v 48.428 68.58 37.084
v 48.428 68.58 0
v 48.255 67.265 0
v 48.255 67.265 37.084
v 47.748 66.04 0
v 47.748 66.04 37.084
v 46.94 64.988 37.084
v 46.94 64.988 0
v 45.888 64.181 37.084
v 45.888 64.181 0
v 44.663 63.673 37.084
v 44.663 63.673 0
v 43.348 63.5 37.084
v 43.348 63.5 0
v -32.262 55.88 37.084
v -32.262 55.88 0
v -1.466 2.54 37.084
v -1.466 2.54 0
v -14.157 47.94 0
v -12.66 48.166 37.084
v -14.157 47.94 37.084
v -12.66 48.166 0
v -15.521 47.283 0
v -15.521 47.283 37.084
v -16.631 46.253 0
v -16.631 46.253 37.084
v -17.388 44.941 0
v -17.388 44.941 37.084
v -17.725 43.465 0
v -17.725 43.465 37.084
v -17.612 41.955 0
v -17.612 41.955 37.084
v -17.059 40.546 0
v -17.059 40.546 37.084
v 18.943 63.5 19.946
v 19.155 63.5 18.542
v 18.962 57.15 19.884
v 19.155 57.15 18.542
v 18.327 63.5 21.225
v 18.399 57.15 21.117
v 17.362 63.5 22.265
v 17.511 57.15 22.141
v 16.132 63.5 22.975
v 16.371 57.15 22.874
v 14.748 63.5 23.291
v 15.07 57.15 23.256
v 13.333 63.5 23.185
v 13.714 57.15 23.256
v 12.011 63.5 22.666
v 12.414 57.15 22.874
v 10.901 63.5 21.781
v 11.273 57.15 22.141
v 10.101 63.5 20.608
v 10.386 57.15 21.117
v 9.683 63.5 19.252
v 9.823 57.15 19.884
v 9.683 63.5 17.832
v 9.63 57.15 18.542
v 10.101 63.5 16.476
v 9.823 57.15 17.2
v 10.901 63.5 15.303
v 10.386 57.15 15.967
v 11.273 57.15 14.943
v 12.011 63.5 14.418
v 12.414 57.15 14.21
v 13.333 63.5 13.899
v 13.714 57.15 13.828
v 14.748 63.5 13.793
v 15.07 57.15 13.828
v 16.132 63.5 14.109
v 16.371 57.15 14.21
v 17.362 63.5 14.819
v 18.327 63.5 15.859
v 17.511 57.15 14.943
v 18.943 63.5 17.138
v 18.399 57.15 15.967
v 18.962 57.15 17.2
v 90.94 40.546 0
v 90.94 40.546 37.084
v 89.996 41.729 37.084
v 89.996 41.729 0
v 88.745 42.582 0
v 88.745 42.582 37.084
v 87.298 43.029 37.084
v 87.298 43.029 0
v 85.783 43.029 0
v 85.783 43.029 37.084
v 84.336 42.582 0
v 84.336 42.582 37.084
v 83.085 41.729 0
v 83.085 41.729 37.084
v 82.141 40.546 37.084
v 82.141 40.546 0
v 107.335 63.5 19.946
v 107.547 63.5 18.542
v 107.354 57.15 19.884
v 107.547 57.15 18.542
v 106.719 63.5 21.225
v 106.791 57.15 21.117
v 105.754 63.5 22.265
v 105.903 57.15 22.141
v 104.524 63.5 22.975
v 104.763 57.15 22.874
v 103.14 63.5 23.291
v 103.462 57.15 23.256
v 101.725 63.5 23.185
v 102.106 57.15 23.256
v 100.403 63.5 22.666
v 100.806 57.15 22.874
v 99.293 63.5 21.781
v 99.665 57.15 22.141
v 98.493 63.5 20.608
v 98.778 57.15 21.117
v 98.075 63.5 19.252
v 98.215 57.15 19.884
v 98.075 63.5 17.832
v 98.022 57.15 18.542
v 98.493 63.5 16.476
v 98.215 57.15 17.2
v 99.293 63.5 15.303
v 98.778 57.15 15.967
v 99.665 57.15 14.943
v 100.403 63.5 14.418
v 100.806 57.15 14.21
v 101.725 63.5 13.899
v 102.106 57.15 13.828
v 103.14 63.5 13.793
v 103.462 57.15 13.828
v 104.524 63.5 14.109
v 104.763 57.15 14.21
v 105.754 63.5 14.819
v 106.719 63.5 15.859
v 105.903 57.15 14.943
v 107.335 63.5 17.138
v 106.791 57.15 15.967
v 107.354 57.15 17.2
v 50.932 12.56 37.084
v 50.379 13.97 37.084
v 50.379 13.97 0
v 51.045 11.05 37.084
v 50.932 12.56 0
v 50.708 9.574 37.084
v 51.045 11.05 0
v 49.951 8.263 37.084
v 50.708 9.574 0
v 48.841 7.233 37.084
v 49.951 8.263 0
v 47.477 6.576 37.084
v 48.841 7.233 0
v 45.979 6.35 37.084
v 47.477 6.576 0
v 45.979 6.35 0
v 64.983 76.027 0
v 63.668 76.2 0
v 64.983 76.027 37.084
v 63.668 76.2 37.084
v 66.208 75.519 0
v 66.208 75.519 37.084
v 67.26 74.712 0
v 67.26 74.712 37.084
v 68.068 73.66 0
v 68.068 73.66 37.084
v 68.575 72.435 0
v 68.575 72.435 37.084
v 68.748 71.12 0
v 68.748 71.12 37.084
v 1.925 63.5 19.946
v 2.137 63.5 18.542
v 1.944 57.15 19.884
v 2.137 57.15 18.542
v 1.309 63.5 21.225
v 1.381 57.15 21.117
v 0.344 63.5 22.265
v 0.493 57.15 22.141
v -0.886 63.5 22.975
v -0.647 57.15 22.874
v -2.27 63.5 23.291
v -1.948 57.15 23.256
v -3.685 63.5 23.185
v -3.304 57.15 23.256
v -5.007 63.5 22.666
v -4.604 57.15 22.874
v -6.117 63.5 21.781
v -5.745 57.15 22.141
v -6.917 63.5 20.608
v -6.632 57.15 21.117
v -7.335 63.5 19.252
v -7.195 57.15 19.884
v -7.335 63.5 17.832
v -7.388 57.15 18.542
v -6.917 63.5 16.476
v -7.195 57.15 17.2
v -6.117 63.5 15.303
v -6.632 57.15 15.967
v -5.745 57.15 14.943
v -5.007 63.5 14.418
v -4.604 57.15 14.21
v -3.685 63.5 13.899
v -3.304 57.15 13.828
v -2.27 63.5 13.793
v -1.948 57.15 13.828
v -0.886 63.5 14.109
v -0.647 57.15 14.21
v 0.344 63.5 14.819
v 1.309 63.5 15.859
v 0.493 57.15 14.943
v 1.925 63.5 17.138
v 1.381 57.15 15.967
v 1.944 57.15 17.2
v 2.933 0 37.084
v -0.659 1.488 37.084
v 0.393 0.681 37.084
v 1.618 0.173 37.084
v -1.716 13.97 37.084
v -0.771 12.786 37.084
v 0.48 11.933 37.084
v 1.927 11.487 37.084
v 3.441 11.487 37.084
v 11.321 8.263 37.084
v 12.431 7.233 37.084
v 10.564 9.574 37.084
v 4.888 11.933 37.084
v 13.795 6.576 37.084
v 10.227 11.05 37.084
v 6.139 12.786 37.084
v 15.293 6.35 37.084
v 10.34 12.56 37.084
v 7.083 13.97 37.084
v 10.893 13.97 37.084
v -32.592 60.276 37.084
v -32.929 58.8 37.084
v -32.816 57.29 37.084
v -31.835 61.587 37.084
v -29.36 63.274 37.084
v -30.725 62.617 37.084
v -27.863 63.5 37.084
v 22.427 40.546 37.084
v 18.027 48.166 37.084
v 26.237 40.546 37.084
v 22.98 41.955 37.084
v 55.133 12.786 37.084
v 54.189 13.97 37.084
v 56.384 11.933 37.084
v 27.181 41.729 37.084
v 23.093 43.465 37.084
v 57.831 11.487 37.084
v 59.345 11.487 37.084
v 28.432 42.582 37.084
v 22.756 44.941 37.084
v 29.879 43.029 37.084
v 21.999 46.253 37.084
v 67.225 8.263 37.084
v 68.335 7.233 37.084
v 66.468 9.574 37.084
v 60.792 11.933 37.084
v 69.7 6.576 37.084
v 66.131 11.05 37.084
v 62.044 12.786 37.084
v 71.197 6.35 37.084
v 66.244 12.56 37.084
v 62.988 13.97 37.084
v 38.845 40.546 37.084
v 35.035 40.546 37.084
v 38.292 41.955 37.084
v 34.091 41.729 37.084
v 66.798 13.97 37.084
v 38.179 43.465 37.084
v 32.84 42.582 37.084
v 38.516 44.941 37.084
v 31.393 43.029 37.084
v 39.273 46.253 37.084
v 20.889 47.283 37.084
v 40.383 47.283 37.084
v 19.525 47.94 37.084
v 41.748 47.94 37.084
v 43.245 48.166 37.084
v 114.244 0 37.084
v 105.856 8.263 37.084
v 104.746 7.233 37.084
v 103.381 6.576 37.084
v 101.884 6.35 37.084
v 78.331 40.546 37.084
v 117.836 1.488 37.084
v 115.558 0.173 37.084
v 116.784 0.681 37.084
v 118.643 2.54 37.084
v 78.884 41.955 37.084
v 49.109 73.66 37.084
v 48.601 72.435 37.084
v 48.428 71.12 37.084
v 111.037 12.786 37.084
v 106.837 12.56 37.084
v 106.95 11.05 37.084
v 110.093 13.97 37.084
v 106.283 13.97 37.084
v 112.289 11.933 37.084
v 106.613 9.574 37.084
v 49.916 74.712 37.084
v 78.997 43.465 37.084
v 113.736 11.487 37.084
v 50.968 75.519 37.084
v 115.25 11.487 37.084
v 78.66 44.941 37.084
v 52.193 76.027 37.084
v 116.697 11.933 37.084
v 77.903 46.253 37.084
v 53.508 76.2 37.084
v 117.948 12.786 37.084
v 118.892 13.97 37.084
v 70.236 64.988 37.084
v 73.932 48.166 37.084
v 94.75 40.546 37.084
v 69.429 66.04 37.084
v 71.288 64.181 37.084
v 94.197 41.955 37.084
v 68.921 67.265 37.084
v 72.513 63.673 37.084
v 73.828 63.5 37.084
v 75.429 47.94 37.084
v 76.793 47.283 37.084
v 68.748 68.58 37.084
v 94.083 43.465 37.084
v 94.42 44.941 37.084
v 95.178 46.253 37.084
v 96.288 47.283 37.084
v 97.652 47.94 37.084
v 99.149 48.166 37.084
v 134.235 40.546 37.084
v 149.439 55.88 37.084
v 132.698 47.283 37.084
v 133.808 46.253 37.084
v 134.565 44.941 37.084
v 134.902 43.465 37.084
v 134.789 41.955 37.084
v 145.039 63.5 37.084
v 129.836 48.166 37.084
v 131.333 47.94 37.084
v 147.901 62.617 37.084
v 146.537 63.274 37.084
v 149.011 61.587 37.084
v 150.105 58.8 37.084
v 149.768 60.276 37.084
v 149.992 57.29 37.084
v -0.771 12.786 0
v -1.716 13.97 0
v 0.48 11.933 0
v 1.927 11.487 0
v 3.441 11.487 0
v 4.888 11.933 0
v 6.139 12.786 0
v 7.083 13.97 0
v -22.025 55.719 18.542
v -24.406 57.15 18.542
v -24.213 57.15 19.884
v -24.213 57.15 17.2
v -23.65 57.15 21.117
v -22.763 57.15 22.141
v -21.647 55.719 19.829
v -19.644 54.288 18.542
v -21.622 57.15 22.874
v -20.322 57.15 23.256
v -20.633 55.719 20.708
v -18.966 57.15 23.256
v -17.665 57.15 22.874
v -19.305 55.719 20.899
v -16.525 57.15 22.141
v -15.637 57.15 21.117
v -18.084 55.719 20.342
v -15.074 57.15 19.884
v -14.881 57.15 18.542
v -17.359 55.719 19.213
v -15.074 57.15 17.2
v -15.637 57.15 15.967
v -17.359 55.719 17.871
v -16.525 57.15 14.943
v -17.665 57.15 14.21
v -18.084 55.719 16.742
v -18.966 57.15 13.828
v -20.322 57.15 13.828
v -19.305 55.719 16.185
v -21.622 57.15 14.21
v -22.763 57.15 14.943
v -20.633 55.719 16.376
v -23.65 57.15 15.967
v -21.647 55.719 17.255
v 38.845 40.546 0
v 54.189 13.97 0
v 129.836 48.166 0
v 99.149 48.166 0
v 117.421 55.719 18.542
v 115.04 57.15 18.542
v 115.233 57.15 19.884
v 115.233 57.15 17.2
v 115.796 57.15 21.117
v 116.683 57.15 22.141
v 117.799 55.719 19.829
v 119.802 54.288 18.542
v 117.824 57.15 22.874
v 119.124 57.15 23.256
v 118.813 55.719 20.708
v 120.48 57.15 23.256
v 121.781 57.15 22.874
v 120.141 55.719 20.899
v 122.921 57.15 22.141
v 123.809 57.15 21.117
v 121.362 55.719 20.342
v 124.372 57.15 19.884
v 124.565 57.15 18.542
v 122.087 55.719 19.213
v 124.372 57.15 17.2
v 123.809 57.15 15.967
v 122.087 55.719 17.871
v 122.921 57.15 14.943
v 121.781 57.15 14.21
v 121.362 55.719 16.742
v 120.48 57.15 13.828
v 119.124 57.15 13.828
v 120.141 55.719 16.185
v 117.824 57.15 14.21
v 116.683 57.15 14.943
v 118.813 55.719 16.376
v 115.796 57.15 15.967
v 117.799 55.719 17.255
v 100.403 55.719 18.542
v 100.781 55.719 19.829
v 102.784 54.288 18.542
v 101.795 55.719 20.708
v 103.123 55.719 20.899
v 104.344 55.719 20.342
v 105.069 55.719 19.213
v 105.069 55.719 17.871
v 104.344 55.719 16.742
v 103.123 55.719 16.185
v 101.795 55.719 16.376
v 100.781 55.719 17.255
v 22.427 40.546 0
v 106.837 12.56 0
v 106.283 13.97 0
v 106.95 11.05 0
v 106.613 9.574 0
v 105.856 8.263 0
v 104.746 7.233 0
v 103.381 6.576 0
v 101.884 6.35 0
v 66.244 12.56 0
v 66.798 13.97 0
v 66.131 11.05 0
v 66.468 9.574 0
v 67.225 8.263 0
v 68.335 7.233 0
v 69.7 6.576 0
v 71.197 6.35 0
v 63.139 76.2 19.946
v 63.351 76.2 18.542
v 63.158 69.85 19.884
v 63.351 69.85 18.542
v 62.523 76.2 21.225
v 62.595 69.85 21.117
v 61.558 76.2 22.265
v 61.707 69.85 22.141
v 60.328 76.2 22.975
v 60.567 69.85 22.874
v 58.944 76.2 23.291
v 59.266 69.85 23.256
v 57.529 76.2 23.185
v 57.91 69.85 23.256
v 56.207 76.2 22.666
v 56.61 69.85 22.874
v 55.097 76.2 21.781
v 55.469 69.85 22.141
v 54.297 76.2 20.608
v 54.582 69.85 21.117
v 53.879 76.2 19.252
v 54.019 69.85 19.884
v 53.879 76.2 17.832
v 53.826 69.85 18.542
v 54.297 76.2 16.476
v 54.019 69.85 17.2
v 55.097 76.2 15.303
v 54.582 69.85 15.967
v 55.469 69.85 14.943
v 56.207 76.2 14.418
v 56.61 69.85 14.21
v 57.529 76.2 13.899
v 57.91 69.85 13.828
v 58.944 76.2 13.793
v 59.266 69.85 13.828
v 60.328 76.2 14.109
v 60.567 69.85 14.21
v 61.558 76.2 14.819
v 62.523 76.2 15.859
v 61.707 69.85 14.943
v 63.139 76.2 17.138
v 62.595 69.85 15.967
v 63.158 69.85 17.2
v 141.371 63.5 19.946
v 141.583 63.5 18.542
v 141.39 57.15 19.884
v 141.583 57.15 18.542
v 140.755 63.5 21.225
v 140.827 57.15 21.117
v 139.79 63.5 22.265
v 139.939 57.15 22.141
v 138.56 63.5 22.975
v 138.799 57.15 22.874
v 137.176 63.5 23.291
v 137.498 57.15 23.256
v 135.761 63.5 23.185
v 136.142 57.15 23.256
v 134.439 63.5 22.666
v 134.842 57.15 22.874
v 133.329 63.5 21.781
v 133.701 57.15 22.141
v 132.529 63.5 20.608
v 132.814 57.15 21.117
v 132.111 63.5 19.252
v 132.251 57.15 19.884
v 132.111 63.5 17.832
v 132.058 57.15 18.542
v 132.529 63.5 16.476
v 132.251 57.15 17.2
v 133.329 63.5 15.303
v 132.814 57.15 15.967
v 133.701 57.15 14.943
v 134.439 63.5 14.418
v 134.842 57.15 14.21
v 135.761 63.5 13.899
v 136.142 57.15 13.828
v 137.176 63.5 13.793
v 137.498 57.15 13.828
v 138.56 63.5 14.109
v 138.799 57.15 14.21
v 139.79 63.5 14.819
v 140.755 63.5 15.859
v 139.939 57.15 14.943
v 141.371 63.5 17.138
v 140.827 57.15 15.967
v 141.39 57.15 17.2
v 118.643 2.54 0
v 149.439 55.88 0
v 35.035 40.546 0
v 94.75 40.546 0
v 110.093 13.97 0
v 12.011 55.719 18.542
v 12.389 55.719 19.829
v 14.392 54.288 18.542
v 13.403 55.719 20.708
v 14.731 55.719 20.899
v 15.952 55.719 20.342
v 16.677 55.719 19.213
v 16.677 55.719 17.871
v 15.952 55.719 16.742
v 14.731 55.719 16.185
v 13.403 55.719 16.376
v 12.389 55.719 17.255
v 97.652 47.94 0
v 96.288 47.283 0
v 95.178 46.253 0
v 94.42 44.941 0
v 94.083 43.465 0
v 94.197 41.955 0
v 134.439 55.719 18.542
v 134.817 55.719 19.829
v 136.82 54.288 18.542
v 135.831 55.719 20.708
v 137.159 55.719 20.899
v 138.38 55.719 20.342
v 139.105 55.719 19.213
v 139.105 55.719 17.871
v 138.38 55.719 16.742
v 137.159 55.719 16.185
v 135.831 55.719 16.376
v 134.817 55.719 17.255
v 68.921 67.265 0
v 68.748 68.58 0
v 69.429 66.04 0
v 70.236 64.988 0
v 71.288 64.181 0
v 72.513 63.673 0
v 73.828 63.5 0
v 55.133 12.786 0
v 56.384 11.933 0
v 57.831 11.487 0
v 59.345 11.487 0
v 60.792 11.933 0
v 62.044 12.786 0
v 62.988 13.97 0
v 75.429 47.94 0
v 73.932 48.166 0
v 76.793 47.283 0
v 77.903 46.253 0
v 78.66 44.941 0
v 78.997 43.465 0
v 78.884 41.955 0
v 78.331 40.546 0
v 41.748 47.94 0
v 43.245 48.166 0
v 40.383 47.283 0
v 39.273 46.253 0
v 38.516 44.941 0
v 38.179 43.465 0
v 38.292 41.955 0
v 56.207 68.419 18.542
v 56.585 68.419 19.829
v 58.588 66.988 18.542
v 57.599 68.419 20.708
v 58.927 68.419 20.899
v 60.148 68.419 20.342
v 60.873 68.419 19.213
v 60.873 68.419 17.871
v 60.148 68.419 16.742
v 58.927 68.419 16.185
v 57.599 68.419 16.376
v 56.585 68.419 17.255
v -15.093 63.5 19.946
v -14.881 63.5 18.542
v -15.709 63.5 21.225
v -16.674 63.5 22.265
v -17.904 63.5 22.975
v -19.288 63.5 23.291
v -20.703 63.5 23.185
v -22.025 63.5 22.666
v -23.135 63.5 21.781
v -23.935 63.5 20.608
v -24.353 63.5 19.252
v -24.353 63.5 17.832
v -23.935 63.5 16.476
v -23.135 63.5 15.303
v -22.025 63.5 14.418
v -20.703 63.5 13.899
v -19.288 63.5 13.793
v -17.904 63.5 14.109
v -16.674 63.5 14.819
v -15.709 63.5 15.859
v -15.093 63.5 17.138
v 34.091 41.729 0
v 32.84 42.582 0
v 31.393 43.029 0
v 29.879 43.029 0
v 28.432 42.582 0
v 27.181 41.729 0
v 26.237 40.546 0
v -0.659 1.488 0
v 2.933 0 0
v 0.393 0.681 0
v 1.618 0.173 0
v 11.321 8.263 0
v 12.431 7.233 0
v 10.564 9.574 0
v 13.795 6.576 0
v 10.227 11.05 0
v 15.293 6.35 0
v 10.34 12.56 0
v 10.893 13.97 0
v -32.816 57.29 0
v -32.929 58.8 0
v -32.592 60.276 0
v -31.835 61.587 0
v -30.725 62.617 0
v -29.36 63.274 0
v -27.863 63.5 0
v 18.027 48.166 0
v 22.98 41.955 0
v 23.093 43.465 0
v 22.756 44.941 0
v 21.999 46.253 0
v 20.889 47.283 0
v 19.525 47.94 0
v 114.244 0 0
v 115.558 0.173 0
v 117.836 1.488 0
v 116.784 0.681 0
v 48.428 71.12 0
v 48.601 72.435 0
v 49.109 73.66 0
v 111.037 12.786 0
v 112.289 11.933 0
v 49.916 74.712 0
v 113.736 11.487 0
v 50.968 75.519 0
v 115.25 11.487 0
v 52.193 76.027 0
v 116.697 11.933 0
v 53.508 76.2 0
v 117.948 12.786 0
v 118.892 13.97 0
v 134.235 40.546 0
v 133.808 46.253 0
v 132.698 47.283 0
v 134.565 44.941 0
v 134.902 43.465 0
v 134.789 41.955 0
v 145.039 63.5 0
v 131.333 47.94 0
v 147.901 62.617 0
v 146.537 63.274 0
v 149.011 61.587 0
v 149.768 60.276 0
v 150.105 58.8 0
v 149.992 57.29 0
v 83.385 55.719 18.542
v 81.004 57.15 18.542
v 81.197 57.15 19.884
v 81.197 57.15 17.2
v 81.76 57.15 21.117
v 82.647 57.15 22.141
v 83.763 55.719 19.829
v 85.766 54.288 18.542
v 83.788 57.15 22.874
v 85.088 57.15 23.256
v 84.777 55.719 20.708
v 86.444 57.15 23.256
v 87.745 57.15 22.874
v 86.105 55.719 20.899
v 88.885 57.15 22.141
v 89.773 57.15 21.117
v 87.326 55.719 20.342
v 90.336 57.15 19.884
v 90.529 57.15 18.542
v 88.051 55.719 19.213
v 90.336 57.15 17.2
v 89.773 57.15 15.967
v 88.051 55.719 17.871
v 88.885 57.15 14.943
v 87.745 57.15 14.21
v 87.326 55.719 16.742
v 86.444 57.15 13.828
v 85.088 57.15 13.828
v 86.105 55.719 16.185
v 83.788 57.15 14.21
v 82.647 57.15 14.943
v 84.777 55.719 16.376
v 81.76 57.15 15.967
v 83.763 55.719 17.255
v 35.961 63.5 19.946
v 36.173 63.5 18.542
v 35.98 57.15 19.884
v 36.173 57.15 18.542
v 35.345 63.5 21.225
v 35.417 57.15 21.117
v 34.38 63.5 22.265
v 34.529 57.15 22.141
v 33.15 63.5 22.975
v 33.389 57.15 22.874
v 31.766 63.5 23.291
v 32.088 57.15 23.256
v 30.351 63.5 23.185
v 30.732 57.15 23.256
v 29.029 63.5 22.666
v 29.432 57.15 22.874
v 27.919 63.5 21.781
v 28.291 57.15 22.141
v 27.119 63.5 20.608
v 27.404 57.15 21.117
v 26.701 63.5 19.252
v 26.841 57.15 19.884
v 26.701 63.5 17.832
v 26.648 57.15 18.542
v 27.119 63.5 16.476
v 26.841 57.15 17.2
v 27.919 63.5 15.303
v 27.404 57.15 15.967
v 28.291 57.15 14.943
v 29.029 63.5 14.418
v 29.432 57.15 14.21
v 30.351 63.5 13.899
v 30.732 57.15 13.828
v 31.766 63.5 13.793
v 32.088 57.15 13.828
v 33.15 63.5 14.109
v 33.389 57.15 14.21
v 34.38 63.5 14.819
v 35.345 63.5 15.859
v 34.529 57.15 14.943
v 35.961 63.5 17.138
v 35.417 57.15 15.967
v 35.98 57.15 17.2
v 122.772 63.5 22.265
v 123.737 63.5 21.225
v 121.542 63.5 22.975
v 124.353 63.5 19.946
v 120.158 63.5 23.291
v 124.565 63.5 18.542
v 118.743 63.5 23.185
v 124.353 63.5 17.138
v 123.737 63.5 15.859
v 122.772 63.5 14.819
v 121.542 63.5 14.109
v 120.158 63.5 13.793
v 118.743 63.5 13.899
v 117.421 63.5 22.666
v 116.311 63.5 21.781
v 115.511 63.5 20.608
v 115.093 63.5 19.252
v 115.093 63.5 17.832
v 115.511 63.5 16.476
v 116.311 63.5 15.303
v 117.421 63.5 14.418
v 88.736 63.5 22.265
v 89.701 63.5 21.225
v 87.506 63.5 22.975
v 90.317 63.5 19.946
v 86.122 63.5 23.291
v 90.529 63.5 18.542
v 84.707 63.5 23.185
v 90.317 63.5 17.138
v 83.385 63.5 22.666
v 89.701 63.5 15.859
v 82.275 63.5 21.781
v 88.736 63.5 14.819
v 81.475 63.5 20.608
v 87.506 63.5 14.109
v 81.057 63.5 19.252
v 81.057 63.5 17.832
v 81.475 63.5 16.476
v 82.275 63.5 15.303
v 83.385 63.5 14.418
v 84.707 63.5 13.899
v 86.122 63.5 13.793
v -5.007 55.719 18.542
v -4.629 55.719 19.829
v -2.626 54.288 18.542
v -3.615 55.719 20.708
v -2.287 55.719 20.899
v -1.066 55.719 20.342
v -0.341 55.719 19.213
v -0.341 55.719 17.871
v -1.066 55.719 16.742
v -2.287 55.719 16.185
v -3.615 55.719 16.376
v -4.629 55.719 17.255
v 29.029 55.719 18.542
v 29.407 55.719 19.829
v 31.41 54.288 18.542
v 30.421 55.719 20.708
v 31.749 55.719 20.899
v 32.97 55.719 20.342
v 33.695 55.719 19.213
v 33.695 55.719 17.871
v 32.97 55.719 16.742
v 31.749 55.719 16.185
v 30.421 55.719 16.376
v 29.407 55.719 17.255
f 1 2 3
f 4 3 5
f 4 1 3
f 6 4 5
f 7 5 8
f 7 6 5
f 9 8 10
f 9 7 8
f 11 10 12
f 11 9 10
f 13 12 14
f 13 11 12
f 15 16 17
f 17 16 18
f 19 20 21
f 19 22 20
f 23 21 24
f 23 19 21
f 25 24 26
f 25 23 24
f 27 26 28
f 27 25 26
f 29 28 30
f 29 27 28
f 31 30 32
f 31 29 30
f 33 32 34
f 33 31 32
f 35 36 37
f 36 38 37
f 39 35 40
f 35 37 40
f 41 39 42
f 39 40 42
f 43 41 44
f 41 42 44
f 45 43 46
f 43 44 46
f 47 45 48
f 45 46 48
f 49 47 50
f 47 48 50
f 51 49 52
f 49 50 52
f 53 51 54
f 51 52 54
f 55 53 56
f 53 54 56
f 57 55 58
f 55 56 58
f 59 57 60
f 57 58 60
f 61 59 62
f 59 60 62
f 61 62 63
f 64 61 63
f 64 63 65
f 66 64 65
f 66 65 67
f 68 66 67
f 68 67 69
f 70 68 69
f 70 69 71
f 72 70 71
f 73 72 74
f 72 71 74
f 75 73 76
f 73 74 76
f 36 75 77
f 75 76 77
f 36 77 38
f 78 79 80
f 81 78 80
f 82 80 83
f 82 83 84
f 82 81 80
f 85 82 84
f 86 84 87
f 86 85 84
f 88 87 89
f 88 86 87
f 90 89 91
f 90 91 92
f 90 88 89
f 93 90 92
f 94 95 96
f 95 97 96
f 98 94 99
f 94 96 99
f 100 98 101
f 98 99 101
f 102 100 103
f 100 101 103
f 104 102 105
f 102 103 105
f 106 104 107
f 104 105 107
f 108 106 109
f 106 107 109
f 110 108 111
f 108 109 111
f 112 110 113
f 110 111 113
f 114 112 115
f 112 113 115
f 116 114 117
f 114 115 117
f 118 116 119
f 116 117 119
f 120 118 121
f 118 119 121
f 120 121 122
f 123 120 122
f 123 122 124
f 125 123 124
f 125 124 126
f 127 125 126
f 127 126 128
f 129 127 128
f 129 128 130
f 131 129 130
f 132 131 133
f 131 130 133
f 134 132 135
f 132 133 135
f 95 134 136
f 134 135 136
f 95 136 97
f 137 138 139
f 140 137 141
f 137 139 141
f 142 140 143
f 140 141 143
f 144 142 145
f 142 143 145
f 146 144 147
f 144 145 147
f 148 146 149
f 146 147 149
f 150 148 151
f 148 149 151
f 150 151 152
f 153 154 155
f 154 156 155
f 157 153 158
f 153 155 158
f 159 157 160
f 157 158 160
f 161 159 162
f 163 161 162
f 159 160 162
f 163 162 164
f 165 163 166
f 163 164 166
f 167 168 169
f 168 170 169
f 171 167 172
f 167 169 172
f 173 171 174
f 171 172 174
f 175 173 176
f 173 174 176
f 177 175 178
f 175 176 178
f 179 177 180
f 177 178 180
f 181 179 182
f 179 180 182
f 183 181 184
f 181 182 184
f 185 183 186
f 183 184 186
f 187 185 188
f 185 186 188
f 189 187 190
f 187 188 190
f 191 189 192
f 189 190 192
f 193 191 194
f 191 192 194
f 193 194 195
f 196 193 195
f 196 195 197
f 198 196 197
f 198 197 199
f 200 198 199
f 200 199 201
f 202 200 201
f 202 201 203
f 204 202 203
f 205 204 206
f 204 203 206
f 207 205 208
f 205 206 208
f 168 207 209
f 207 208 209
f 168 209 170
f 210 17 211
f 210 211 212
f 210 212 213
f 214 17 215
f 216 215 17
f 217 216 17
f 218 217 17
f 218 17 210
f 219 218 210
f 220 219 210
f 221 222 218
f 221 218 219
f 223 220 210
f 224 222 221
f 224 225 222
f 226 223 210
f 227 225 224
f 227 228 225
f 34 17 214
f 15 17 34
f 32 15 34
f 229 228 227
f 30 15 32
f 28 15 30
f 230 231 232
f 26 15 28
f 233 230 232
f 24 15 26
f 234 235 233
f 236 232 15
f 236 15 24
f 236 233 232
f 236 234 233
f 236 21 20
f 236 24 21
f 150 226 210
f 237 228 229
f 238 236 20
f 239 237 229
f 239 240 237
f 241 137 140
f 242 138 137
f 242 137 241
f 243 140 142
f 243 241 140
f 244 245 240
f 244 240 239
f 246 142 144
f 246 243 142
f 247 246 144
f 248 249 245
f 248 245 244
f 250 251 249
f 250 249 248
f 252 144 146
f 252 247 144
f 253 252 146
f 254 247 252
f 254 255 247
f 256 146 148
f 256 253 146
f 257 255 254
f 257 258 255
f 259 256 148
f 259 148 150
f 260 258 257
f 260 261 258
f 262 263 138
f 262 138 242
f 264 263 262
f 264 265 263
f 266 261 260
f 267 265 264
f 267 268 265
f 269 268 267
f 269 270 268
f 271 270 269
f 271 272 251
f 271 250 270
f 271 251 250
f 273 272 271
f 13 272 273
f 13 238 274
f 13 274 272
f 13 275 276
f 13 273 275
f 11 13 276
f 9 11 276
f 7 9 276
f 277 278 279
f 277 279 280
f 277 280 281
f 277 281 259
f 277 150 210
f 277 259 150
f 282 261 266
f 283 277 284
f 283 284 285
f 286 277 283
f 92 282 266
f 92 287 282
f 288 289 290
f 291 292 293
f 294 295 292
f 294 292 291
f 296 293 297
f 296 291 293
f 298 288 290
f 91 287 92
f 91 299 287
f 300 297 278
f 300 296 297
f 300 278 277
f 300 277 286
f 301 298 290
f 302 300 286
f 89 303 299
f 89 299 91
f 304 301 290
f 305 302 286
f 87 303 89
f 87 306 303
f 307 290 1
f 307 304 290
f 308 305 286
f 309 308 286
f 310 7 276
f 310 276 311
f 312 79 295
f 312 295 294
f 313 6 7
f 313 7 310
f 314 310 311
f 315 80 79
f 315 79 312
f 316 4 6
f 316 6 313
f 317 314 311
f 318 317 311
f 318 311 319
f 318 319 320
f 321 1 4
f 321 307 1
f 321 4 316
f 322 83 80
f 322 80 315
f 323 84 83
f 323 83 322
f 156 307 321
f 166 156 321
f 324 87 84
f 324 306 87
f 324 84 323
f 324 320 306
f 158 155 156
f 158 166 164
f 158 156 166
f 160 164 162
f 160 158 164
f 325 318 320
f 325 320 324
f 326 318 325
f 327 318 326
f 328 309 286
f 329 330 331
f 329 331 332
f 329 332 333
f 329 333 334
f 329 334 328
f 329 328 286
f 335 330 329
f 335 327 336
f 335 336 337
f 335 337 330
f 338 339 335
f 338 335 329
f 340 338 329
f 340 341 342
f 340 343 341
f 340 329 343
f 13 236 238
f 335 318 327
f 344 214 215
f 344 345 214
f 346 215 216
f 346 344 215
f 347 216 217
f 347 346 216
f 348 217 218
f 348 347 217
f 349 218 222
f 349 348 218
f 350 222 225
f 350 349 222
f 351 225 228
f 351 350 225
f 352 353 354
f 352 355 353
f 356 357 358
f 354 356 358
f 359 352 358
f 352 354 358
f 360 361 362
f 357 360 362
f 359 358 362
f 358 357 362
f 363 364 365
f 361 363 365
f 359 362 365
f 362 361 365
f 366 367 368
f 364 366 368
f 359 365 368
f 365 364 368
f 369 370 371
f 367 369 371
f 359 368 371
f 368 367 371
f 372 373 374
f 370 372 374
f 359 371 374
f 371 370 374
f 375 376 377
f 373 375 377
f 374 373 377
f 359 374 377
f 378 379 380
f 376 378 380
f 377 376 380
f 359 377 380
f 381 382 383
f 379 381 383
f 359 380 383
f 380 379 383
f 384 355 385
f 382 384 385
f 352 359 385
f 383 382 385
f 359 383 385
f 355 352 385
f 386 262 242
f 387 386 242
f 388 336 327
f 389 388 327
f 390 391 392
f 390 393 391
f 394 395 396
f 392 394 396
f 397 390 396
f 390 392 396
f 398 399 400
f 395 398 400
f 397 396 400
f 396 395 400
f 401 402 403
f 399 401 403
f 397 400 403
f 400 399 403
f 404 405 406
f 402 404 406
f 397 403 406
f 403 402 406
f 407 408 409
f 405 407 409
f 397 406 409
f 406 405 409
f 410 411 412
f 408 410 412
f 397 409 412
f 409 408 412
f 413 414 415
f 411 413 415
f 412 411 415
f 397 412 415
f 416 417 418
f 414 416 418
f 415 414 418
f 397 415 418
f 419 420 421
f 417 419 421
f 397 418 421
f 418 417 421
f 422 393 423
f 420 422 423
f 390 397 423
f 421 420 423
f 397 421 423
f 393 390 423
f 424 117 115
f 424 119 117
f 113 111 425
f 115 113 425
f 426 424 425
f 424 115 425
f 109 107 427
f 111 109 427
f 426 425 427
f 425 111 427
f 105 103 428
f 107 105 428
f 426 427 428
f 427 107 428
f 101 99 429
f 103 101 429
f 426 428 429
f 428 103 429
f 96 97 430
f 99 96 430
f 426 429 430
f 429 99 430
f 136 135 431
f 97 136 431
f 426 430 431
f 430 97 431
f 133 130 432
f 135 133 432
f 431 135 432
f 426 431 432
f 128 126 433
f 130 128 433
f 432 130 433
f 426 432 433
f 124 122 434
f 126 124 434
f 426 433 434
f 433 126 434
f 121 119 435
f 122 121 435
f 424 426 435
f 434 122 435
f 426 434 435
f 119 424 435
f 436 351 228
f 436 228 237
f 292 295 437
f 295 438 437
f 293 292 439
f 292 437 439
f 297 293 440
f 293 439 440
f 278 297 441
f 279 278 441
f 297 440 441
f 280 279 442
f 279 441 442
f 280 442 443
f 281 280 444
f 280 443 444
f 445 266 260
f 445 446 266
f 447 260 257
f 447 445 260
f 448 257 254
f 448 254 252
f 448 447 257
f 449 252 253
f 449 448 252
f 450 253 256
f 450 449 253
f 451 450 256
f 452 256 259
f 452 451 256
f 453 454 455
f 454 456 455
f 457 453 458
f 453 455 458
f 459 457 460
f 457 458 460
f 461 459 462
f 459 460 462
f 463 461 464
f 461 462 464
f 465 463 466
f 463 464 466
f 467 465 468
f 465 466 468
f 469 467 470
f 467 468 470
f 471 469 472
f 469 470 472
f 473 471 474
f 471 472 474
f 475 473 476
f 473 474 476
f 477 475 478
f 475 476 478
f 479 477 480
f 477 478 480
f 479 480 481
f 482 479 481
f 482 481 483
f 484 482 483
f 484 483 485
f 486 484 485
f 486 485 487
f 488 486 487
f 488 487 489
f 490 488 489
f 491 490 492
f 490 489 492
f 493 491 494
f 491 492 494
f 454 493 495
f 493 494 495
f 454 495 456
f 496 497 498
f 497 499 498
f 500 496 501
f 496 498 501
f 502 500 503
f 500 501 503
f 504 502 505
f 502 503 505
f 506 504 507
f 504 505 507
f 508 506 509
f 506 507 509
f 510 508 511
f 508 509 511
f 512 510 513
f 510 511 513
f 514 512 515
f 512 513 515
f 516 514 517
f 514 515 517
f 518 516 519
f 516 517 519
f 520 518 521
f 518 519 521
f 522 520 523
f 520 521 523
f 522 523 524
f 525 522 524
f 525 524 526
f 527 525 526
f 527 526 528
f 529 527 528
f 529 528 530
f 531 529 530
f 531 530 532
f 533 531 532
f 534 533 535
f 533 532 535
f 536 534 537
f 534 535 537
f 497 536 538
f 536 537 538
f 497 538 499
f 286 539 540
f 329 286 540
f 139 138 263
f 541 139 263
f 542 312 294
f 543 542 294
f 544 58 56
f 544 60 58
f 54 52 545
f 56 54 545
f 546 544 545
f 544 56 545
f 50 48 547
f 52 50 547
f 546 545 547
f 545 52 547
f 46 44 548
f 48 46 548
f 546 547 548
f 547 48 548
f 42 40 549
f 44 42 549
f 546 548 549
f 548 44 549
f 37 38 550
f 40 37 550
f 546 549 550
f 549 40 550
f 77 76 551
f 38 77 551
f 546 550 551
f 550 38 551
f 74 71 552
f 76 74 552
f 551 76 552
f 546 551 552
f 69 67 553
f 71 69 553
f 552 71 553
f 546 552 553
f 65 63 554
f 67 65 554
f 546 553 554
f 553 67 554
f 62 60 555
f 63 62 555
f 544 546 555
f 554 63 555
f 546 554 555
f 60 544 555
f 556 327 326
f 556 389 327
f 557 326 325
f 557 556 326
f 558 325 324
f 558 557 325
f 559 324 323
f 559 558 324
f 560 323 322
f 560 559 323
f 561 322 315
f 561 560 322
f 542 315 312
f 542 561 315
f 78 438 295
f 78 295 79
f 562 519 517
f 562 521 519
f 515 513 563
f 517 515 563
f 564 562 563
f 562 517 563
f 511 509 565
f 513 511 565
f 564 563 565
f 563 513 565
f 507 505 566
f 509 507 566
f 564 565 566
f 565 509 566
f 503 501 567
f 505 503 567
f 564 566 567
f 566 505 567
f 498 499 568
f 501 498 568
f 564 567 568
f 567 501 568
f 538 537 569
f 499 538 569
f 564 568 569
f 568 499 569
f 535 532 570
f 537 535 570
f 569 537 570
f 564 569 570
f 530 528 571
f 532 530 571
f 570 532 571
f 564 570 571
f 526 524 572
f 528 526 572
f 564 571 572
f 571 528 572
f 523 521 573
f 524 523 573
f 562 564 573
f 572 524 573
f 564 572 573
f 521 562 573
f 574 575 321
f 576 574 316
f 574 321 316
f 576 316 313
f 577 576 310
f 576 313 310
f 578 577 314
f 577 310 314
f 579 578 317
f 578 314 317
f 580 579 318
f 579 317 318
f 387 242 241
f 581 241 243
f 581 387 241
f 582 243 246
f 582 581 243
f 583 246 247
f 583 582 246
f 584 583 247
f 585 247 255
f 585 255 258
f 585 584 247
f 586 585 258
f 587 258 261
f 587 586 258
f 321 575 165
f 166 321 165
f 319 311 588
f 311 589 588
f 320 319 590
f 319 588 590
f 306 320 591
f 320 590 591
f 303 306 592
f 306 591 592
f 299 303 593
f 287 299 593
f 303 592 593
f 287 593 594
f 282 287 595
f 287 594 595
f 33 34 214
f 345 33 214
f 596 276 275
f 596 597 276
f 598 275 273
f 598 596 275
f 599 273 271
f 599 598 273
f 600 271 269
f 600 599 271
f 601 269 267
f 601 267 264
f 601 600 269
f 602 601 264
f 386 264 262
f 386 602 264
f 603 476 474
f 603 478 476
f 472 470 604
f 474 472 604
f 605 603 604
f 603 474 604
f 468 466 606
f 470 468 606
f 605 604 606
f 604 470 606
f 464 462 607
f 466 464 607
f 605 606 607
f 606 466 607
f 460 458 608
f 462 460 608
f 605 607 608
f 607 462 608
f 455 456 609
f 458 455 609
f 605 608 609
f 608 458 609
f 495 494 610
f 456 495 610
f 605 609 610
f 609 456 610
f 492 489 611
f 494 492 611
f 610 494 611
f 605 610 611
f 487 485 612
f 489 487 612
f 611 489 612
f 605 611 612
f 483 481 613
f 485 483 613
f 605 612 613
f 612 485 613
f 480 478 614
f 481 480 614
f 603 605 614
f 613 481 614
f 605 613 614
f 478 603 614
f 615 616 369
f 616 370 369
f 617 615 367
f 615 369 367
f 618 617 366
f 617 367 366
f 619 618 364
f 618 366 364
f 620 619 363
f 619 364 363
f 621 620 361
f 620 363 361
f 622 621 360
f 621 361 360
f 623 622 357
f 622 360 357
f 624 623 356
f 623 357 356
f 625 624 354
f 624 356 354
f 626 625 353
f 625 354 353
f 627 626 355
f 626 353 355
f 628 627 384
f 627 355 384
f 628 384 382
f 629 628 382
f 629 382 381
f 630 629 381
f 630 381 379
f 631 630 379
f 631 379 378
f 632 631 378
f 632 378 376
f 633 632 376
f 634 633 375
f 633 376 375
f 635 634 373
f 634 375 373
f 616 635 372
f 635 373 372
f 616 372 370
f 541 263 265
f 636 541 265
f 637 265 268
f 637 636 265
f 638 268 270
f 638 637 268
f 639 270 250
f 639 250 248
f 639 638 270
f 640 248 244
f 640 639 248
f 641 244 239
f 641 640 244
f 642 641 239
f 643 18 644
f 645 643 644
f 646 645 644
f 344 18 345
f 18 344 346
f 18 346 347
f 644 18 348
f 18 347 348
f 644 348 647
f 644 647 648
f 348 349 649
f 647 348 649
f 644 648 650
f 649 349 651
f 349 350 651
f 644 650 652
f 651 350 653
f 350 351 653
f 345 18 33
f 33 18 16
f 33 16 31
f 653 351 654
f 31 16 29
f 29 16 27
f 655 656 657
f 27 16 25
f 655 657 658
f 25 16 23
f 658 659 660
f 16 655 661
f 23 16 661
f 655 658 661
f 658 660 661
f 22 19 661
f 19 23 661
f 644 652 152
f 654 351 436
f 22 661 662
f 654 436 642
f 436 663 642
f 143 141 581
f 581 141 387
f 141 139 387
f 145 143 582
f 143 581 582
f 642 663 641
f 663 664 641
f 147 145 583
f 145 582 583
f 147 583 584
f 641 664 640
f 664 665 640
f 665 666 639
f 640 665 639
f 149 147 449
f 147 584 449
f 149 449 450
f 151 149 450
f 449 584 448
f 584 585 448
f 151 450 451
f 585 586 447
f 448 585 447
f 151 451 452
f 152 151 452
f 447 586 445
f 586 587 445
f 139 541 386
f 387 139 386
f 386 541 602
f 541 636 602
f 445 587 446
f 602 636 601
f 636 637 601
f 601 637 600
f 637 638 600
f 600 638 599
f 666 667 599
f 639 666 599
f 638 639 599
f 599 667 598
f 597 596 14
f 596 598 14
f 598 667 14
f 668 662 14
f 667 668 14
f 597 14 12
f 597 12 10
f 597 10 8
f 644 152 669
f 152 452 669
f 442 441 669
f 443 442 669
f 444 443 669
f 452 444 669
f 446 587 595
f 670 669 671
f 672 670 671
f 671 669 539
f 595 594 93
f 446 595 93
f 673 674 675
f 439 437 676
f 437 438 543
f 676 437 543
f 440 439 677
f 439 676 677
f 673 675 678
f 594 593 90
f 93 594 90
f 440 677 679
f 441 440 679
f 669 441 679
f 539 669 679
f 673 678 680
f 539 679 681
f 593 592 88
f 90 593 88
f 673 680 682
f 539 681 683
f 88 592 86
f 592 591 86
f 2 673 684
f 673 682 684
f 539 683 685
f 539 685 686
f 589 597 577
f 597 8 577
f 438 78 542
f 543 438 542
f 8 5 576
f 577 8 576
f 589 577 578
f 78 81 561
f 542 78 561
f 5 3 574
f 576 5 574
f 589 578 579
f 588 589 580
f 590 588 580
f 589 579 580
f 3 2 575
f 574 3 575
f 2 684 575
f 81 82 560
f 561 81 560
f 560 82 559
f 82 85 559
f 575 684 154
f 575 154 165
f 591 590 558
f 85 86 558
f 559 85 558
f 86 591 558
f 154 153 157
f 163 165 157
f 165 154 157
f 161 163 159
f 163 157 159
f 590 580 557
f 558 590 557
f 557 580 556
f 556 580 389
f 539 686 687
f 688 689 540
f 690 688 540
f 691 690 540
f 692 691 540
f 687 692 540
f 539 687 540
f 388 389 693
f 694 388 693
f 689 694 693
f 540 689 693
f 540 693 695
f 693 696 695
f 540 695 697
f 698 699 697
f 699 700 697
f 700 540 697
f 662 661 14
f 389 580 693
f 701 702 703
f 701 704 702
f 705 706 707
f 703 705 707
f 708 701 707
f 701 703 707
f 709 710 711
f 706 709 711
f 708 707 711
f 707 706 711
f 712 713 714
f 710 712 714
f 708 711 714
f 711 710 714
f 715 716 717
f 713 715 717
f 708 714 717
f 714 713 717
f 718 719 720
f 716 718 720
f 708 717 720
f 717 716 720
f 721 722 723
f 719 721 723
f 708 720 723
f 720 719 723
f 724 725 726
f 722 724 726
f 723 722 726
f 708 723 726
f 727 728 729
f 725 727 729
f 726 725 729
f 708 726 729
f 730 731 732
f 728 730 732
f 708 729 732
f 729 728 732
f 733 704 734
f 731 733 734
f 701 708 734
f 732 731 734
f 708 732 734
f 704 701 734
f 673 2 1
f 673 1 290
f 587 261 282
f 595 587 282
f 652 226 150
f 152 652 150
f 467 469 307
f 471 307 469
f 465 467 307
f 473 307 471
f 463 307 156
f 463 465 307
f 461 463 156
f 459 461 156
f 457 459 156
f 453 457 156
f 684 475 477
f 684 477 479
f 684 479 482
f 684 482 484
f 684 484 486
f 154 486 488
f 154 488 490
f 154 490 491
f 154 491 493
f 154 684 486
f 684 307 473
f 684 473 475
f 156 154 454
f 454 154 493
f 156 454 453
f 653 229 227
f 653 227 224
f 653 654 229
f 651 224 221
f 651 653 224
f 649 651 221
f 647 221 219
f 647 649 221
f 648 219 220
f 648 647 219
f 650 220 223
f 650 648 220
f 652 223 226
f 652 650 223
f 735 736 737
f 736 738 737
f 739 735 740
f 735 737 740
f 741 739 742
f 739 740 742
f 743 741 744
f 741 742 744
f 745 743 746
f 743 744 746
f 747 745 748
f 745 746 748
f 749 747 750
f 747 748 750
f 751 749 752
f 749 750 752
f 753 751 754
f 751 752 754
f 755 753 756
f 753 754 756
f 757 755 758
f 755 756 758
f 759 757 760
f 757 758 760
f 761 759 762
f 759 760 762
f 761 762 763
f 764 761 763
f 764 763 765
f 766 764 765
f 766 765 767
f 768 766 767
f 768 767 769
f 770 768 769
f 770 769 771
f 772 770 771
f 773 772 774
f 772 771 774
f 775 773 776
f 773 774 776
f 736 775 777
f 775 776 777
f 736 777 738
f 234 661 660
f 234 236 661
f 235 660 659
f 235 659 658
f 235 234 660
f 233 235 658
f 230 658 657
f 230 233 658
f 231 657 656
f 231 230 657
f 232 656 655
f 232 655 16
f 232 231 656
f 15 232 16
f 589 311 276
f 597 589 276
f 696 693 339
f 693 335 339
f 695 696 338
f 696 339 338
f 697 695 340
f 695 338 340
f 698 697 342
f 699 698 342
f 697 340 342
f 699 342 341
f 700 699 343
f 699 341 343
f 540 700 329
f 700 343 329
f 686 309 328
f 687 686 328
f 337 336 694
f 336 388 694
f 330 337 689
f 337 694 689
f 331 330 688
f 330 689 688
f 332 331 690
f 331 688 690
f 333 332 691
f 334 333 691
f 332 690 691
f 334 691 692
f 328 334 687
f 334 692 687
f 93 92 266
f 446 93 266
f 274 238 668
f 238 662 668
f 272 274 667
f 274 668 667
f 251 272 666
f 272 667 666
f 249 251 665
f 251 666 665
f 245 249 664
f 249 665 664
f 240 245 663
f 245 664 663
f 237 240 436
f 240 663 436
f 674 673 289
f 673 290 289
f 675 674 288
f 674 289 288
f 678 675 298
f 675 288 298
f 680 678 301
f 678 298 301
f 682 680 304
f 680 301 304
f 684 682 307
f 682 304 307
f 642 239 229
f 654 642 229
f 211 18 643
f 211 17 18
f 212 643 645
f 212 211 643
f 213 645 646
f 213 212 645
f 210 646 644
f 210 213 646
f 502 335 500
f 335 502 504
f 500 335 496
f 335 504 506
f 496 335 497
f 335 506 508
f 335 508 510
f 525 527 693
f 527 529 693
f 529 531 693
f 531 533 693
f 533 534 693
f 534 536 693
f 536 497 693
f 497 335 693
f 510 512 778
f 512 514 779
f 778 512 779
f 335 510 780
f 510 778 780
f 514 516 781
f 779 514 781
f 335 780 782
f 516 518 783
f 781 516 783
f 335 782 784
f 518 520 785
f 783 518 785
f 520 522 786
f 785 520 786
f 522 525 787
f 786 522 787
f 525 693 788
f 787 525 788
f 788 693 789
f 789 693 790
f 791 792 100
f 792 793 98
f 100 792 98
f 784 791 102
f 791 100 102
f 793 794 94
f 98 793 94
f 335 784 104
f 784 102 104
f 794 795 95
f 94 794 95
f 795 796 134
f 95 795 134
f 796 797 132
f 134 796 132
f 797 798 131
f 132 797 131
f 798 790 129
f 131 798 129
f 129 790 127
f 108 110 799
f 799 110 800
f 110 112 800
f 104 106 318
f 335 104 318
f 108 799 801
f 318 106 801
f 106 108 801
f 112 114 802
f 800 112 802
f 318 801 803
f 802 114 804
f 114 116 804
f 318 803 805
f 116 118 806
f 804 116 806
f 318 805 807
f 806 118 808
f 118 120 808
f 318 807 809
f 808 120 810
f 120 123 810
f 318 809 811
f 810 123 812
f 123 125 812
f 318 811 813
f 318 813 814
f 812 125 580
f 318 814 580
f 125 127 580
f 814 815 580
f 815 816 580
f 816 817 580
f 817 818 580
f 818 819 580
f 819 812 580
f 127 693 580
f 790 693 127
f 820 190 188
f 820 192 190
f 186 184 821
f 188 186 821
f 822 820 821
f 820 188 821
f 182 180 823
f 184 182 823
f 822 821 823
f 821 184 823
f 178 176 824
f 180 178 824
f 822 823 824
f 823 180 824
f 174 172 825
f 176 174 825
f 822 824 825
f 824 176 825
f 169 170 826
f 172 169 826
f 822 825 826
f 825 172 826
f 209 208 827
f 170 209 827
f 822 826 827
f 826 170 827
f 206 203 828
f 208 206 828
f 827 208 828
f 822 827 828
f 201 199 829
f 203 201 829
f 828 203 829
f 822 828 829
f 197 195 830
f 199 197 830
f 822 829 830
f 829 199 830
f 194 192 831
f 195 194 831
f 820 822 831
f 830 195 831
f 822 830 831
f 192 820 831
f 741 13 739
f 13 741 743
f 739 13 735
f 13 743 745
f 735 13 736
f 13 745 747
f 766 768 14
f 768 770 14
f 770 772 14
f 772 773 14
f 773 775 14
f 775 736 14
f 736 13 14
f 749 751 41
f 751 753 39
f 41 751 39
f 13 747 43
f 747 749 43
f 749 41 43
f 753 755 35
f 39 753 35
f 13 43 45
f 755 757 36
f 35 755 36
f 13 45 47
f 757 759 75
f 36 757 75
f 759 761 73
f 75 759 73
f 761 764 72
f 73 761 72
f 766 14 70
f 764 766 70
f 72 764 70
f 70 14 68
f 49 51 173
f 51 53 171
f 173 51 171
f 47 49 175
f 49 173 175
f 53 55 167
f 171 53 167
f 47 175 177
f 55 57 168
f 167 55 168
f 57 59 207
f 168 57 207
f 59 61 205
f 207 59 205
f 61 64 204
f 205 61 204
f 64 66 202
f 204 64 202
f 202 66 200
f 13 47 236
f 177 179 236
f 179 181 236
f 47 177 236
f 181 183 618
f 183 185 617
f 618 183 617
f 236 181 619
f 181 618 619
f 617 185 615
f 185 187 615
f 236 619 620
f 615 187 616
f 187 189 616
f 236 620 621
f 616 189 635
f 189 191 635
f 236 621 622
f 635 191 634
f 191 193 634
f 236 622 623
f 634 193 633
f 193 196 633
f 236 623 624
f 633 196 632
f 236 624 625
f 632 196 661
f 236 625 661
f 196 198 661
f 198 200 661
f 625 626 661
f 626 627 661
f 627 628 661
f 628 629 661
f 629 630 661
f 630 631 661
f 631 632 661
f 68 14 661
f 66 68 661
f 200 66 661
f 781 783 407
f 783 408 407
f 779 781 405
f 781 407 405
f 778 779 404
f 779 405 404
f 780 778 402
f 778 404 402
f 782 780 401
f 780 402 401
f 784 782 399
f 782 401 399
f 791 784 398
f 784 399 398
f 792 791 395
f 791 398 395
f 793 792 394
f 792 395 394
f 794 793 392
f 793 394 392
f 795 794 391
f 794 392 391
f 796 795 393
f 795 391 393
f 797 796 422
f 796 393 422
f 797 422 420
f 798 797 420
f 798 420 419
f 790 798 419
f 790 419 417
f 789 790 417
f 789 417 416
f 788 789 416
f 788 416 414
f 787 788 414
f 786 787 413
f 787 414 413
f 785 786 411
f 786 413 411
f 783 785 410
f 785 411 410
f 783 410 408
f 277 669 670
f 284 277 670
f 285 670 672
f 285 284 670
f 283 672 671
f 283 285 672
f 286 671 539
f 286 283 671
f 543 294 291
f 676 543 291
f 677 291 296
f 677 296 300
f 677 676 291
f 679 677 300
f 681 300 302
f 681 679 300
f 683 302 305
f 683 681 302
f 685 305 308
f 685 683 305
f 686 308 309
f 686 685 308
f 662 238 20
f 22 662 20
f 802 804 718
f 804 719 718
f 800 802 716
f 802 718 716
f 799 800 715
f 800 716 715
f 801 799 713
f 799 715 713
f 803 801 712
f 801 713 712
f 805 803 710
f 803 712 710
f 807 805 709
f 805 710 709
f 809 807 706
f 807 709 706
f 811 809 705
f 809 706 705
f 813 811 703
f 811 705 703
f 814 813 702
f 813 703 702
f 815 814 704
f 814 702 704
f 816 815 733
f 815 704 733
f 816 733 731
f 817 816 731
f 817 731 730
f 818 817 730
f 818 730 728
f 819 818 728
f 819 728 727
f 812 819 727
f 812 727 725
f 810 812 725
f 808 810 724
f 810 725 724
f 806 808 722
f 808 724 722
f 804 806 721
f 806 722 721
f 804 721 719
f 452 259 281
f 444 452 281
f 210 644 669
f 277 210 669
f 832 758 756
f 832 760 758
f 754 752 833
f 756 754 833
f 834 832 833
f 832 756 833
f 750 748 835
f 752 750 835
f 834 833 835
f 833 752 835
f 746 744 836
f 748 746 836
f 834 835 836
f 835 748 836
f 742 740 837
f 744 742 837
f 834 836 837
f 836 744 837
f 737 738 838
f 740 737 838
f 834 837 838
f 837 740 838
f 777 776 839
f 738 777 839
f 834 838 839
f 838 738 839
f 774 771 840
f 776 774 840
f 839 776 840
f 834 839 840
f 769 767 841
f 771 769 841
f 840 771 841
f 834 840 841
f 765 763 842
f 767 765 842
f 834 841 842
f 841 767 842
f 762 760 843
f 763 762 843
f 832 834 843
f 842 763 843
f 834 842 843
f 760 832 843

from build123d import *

# Parameters (mm, degrees)
F0_W           = 20.32
F0_H           = 12.7
F1_DEPTH       = 37.084
F5_D           = 9.525
F5_DEPTH       = 6.35
F5_TIP         = 2.8615986981
F5_ON_F3_D     = 9.525
F5_ON_F3_DEPTH = 6.35
F5_ON_F3_TIP   = 2.8615986981
F5_ON_F4_D     = 9.525
F5_ON_F4_DEPTH = 6.35
F5_ON_F4_TIP   = 2.8615986981
F7_DEPTH       = 37.085
F8_R           = 5.08


# Not quite as in the source:
# - a length typed as a fraction of an inch, garbled in the dataset ("3 / 203.2 mm" for 3/8 in), is restored


with BuildPart() as f1:
    # F0 (on Top) → F1 (new body)
    with BuildSketch(Plane.XY):
        with Locations((58.5882579065, 69.85)):
            Rectangle(F0_W, F0_H)
        Polygon((48.4282579065, 63.5), (-36.6617420935, 63.5), (0, 0), (117.1765158129, 0), (153.8382579065, 63.5), (68.7482579065, 63.5), align=None)
    extrude(amount=F1_DEPTH)

    # F5
    with Locations(Plane(origin=(0, 63.5, 0), x_dir=(-1, 0, 0), z_dir=(0, 1, 0))):
        with Locations((-136.8202579065, 18.542), (-119.8022579065, 18.542), (-102.7842579065, 18.542), (-85.7662579065, 18.542)):
            Hole(F5_D / 2, depth=F5_DEPTH)
            with Locations((0, 0, -(F5_DEPTH + F5_TIP / 2))):  # 118° drill point
                Cone(0, F5_D / 2, F5_TIP, mode=Mode.SUBTRACT)

    # F5 on F3
    with Locations(Plane(origin=(0, 63.5, 0), x_dir=(-1, 0, 0), z_dir=(0, 1, 0))):
        with Locations((-31.4102579065, 18.542), (-14.3922579065, 18.542), (2.6257420935, 18.542), (19.6437420935, 18.542)):
            Hole(F5_ON_F3_D / 2, depth=F5_ON_F3_DEPTH)
            with Locations((0, 0, -(F5_ON_F3_DEPTH + F5_ON_F3_TIP / 2))):  # 118° drill point
                Cone(0, F5_ON_F3_D / 2, F5_ON_F3_TIP, mode=Mode.SUBTRACT)

    # F5 on F4
    with Locations(Plane(origin=(0, 76.2, 0), x_dir=(-1, 0, 0), z_dir=(0, 1, 0))):
        with Locations((-58.5882579065, 18.542)):
            Hole(F5_ON_F4_D / 2, depth=F5_ON_F4_DEPTH)
            with Locations((0, 0, -(F5_ON_F4_DEPTH + F5_ON_F4_TIP / 2))):  # 118° drill point
                Cone(0, F5_ON_F4_D / 2, F5_ON_F4_TIP, mode=Mode.SUBTRACT)

    # F6 (on face) → F7 (cut, through all)
    with BuildSketch(Plane.XY.offset(37.084)):
        Polygon((26.8260418486, 48.1655448196), (-21.4583902673, 48.1655448196), (2.6838257906, 6.35), align=None)
        Polygon((54.7782579065, 6.35), (30.6360418486, 48.1655448196), (6.4938257906, 6.35), align=None)
        Polygon((82.7304739644, 48.1655448196), (34.4460418486, 48.1655448196), (58.5882579065, 6.35), align=None)
        Polygon((110.6826900223, 6.35), (86.5404739644, 48.1655448196), (62.3982579065, 6.35), align=None)
        Polygon((138.6349060802, 48.1655448196), (90.3504739644, 48.1655448196), (114.4926900223, 6.35), align=None)
    extrude(amount=-F7_DEPTH, mode=Mode.SUBTRACT)

    # F8
    f8_edges = [f1.edges().sort_by_distance(p)[0] for p in [
        (48.428258, 63.5, 18.542),
        (68.748258, 63.5, 18.542),
        (48.428258, 76.2, 18.542),
        (68.748258, 76.2, 18.542),
        (153.838258, 63.5, 18.542),
        (-36.661742, 63.5, 18.542),
        (-21.45839, 48.165545, 18.542),
        (0, 0, 18.542),
        (26.826042, 48.165545, 18.542),
        (82.730474, 48.165545, 18.542),
        (138.634906, 48.165545, 18.542),
        (110.68269, 6.35, 18.542),
        (114.49269, 6.35, 18.542),
        (2.683826, 6.35, 18.542),
        (117.176516, 0, 18.542),
        (90.350474, 48.165545, 18.542),
        (34.446042, 48.165545, 18.542),
        (30.636042, 48.165545, 18.542),
        (86.540474, 48.165545, 18.542),
        (62.398258, 6.35, 18.542),
        (6.493826, 6.35, 18.542),
        (58.588258, 6.35, 18.542),
        (54.778258, 6.35, 18.542),
    ]]
    fillet(f8_edges, radius=F8_R)


solid = f1.part
